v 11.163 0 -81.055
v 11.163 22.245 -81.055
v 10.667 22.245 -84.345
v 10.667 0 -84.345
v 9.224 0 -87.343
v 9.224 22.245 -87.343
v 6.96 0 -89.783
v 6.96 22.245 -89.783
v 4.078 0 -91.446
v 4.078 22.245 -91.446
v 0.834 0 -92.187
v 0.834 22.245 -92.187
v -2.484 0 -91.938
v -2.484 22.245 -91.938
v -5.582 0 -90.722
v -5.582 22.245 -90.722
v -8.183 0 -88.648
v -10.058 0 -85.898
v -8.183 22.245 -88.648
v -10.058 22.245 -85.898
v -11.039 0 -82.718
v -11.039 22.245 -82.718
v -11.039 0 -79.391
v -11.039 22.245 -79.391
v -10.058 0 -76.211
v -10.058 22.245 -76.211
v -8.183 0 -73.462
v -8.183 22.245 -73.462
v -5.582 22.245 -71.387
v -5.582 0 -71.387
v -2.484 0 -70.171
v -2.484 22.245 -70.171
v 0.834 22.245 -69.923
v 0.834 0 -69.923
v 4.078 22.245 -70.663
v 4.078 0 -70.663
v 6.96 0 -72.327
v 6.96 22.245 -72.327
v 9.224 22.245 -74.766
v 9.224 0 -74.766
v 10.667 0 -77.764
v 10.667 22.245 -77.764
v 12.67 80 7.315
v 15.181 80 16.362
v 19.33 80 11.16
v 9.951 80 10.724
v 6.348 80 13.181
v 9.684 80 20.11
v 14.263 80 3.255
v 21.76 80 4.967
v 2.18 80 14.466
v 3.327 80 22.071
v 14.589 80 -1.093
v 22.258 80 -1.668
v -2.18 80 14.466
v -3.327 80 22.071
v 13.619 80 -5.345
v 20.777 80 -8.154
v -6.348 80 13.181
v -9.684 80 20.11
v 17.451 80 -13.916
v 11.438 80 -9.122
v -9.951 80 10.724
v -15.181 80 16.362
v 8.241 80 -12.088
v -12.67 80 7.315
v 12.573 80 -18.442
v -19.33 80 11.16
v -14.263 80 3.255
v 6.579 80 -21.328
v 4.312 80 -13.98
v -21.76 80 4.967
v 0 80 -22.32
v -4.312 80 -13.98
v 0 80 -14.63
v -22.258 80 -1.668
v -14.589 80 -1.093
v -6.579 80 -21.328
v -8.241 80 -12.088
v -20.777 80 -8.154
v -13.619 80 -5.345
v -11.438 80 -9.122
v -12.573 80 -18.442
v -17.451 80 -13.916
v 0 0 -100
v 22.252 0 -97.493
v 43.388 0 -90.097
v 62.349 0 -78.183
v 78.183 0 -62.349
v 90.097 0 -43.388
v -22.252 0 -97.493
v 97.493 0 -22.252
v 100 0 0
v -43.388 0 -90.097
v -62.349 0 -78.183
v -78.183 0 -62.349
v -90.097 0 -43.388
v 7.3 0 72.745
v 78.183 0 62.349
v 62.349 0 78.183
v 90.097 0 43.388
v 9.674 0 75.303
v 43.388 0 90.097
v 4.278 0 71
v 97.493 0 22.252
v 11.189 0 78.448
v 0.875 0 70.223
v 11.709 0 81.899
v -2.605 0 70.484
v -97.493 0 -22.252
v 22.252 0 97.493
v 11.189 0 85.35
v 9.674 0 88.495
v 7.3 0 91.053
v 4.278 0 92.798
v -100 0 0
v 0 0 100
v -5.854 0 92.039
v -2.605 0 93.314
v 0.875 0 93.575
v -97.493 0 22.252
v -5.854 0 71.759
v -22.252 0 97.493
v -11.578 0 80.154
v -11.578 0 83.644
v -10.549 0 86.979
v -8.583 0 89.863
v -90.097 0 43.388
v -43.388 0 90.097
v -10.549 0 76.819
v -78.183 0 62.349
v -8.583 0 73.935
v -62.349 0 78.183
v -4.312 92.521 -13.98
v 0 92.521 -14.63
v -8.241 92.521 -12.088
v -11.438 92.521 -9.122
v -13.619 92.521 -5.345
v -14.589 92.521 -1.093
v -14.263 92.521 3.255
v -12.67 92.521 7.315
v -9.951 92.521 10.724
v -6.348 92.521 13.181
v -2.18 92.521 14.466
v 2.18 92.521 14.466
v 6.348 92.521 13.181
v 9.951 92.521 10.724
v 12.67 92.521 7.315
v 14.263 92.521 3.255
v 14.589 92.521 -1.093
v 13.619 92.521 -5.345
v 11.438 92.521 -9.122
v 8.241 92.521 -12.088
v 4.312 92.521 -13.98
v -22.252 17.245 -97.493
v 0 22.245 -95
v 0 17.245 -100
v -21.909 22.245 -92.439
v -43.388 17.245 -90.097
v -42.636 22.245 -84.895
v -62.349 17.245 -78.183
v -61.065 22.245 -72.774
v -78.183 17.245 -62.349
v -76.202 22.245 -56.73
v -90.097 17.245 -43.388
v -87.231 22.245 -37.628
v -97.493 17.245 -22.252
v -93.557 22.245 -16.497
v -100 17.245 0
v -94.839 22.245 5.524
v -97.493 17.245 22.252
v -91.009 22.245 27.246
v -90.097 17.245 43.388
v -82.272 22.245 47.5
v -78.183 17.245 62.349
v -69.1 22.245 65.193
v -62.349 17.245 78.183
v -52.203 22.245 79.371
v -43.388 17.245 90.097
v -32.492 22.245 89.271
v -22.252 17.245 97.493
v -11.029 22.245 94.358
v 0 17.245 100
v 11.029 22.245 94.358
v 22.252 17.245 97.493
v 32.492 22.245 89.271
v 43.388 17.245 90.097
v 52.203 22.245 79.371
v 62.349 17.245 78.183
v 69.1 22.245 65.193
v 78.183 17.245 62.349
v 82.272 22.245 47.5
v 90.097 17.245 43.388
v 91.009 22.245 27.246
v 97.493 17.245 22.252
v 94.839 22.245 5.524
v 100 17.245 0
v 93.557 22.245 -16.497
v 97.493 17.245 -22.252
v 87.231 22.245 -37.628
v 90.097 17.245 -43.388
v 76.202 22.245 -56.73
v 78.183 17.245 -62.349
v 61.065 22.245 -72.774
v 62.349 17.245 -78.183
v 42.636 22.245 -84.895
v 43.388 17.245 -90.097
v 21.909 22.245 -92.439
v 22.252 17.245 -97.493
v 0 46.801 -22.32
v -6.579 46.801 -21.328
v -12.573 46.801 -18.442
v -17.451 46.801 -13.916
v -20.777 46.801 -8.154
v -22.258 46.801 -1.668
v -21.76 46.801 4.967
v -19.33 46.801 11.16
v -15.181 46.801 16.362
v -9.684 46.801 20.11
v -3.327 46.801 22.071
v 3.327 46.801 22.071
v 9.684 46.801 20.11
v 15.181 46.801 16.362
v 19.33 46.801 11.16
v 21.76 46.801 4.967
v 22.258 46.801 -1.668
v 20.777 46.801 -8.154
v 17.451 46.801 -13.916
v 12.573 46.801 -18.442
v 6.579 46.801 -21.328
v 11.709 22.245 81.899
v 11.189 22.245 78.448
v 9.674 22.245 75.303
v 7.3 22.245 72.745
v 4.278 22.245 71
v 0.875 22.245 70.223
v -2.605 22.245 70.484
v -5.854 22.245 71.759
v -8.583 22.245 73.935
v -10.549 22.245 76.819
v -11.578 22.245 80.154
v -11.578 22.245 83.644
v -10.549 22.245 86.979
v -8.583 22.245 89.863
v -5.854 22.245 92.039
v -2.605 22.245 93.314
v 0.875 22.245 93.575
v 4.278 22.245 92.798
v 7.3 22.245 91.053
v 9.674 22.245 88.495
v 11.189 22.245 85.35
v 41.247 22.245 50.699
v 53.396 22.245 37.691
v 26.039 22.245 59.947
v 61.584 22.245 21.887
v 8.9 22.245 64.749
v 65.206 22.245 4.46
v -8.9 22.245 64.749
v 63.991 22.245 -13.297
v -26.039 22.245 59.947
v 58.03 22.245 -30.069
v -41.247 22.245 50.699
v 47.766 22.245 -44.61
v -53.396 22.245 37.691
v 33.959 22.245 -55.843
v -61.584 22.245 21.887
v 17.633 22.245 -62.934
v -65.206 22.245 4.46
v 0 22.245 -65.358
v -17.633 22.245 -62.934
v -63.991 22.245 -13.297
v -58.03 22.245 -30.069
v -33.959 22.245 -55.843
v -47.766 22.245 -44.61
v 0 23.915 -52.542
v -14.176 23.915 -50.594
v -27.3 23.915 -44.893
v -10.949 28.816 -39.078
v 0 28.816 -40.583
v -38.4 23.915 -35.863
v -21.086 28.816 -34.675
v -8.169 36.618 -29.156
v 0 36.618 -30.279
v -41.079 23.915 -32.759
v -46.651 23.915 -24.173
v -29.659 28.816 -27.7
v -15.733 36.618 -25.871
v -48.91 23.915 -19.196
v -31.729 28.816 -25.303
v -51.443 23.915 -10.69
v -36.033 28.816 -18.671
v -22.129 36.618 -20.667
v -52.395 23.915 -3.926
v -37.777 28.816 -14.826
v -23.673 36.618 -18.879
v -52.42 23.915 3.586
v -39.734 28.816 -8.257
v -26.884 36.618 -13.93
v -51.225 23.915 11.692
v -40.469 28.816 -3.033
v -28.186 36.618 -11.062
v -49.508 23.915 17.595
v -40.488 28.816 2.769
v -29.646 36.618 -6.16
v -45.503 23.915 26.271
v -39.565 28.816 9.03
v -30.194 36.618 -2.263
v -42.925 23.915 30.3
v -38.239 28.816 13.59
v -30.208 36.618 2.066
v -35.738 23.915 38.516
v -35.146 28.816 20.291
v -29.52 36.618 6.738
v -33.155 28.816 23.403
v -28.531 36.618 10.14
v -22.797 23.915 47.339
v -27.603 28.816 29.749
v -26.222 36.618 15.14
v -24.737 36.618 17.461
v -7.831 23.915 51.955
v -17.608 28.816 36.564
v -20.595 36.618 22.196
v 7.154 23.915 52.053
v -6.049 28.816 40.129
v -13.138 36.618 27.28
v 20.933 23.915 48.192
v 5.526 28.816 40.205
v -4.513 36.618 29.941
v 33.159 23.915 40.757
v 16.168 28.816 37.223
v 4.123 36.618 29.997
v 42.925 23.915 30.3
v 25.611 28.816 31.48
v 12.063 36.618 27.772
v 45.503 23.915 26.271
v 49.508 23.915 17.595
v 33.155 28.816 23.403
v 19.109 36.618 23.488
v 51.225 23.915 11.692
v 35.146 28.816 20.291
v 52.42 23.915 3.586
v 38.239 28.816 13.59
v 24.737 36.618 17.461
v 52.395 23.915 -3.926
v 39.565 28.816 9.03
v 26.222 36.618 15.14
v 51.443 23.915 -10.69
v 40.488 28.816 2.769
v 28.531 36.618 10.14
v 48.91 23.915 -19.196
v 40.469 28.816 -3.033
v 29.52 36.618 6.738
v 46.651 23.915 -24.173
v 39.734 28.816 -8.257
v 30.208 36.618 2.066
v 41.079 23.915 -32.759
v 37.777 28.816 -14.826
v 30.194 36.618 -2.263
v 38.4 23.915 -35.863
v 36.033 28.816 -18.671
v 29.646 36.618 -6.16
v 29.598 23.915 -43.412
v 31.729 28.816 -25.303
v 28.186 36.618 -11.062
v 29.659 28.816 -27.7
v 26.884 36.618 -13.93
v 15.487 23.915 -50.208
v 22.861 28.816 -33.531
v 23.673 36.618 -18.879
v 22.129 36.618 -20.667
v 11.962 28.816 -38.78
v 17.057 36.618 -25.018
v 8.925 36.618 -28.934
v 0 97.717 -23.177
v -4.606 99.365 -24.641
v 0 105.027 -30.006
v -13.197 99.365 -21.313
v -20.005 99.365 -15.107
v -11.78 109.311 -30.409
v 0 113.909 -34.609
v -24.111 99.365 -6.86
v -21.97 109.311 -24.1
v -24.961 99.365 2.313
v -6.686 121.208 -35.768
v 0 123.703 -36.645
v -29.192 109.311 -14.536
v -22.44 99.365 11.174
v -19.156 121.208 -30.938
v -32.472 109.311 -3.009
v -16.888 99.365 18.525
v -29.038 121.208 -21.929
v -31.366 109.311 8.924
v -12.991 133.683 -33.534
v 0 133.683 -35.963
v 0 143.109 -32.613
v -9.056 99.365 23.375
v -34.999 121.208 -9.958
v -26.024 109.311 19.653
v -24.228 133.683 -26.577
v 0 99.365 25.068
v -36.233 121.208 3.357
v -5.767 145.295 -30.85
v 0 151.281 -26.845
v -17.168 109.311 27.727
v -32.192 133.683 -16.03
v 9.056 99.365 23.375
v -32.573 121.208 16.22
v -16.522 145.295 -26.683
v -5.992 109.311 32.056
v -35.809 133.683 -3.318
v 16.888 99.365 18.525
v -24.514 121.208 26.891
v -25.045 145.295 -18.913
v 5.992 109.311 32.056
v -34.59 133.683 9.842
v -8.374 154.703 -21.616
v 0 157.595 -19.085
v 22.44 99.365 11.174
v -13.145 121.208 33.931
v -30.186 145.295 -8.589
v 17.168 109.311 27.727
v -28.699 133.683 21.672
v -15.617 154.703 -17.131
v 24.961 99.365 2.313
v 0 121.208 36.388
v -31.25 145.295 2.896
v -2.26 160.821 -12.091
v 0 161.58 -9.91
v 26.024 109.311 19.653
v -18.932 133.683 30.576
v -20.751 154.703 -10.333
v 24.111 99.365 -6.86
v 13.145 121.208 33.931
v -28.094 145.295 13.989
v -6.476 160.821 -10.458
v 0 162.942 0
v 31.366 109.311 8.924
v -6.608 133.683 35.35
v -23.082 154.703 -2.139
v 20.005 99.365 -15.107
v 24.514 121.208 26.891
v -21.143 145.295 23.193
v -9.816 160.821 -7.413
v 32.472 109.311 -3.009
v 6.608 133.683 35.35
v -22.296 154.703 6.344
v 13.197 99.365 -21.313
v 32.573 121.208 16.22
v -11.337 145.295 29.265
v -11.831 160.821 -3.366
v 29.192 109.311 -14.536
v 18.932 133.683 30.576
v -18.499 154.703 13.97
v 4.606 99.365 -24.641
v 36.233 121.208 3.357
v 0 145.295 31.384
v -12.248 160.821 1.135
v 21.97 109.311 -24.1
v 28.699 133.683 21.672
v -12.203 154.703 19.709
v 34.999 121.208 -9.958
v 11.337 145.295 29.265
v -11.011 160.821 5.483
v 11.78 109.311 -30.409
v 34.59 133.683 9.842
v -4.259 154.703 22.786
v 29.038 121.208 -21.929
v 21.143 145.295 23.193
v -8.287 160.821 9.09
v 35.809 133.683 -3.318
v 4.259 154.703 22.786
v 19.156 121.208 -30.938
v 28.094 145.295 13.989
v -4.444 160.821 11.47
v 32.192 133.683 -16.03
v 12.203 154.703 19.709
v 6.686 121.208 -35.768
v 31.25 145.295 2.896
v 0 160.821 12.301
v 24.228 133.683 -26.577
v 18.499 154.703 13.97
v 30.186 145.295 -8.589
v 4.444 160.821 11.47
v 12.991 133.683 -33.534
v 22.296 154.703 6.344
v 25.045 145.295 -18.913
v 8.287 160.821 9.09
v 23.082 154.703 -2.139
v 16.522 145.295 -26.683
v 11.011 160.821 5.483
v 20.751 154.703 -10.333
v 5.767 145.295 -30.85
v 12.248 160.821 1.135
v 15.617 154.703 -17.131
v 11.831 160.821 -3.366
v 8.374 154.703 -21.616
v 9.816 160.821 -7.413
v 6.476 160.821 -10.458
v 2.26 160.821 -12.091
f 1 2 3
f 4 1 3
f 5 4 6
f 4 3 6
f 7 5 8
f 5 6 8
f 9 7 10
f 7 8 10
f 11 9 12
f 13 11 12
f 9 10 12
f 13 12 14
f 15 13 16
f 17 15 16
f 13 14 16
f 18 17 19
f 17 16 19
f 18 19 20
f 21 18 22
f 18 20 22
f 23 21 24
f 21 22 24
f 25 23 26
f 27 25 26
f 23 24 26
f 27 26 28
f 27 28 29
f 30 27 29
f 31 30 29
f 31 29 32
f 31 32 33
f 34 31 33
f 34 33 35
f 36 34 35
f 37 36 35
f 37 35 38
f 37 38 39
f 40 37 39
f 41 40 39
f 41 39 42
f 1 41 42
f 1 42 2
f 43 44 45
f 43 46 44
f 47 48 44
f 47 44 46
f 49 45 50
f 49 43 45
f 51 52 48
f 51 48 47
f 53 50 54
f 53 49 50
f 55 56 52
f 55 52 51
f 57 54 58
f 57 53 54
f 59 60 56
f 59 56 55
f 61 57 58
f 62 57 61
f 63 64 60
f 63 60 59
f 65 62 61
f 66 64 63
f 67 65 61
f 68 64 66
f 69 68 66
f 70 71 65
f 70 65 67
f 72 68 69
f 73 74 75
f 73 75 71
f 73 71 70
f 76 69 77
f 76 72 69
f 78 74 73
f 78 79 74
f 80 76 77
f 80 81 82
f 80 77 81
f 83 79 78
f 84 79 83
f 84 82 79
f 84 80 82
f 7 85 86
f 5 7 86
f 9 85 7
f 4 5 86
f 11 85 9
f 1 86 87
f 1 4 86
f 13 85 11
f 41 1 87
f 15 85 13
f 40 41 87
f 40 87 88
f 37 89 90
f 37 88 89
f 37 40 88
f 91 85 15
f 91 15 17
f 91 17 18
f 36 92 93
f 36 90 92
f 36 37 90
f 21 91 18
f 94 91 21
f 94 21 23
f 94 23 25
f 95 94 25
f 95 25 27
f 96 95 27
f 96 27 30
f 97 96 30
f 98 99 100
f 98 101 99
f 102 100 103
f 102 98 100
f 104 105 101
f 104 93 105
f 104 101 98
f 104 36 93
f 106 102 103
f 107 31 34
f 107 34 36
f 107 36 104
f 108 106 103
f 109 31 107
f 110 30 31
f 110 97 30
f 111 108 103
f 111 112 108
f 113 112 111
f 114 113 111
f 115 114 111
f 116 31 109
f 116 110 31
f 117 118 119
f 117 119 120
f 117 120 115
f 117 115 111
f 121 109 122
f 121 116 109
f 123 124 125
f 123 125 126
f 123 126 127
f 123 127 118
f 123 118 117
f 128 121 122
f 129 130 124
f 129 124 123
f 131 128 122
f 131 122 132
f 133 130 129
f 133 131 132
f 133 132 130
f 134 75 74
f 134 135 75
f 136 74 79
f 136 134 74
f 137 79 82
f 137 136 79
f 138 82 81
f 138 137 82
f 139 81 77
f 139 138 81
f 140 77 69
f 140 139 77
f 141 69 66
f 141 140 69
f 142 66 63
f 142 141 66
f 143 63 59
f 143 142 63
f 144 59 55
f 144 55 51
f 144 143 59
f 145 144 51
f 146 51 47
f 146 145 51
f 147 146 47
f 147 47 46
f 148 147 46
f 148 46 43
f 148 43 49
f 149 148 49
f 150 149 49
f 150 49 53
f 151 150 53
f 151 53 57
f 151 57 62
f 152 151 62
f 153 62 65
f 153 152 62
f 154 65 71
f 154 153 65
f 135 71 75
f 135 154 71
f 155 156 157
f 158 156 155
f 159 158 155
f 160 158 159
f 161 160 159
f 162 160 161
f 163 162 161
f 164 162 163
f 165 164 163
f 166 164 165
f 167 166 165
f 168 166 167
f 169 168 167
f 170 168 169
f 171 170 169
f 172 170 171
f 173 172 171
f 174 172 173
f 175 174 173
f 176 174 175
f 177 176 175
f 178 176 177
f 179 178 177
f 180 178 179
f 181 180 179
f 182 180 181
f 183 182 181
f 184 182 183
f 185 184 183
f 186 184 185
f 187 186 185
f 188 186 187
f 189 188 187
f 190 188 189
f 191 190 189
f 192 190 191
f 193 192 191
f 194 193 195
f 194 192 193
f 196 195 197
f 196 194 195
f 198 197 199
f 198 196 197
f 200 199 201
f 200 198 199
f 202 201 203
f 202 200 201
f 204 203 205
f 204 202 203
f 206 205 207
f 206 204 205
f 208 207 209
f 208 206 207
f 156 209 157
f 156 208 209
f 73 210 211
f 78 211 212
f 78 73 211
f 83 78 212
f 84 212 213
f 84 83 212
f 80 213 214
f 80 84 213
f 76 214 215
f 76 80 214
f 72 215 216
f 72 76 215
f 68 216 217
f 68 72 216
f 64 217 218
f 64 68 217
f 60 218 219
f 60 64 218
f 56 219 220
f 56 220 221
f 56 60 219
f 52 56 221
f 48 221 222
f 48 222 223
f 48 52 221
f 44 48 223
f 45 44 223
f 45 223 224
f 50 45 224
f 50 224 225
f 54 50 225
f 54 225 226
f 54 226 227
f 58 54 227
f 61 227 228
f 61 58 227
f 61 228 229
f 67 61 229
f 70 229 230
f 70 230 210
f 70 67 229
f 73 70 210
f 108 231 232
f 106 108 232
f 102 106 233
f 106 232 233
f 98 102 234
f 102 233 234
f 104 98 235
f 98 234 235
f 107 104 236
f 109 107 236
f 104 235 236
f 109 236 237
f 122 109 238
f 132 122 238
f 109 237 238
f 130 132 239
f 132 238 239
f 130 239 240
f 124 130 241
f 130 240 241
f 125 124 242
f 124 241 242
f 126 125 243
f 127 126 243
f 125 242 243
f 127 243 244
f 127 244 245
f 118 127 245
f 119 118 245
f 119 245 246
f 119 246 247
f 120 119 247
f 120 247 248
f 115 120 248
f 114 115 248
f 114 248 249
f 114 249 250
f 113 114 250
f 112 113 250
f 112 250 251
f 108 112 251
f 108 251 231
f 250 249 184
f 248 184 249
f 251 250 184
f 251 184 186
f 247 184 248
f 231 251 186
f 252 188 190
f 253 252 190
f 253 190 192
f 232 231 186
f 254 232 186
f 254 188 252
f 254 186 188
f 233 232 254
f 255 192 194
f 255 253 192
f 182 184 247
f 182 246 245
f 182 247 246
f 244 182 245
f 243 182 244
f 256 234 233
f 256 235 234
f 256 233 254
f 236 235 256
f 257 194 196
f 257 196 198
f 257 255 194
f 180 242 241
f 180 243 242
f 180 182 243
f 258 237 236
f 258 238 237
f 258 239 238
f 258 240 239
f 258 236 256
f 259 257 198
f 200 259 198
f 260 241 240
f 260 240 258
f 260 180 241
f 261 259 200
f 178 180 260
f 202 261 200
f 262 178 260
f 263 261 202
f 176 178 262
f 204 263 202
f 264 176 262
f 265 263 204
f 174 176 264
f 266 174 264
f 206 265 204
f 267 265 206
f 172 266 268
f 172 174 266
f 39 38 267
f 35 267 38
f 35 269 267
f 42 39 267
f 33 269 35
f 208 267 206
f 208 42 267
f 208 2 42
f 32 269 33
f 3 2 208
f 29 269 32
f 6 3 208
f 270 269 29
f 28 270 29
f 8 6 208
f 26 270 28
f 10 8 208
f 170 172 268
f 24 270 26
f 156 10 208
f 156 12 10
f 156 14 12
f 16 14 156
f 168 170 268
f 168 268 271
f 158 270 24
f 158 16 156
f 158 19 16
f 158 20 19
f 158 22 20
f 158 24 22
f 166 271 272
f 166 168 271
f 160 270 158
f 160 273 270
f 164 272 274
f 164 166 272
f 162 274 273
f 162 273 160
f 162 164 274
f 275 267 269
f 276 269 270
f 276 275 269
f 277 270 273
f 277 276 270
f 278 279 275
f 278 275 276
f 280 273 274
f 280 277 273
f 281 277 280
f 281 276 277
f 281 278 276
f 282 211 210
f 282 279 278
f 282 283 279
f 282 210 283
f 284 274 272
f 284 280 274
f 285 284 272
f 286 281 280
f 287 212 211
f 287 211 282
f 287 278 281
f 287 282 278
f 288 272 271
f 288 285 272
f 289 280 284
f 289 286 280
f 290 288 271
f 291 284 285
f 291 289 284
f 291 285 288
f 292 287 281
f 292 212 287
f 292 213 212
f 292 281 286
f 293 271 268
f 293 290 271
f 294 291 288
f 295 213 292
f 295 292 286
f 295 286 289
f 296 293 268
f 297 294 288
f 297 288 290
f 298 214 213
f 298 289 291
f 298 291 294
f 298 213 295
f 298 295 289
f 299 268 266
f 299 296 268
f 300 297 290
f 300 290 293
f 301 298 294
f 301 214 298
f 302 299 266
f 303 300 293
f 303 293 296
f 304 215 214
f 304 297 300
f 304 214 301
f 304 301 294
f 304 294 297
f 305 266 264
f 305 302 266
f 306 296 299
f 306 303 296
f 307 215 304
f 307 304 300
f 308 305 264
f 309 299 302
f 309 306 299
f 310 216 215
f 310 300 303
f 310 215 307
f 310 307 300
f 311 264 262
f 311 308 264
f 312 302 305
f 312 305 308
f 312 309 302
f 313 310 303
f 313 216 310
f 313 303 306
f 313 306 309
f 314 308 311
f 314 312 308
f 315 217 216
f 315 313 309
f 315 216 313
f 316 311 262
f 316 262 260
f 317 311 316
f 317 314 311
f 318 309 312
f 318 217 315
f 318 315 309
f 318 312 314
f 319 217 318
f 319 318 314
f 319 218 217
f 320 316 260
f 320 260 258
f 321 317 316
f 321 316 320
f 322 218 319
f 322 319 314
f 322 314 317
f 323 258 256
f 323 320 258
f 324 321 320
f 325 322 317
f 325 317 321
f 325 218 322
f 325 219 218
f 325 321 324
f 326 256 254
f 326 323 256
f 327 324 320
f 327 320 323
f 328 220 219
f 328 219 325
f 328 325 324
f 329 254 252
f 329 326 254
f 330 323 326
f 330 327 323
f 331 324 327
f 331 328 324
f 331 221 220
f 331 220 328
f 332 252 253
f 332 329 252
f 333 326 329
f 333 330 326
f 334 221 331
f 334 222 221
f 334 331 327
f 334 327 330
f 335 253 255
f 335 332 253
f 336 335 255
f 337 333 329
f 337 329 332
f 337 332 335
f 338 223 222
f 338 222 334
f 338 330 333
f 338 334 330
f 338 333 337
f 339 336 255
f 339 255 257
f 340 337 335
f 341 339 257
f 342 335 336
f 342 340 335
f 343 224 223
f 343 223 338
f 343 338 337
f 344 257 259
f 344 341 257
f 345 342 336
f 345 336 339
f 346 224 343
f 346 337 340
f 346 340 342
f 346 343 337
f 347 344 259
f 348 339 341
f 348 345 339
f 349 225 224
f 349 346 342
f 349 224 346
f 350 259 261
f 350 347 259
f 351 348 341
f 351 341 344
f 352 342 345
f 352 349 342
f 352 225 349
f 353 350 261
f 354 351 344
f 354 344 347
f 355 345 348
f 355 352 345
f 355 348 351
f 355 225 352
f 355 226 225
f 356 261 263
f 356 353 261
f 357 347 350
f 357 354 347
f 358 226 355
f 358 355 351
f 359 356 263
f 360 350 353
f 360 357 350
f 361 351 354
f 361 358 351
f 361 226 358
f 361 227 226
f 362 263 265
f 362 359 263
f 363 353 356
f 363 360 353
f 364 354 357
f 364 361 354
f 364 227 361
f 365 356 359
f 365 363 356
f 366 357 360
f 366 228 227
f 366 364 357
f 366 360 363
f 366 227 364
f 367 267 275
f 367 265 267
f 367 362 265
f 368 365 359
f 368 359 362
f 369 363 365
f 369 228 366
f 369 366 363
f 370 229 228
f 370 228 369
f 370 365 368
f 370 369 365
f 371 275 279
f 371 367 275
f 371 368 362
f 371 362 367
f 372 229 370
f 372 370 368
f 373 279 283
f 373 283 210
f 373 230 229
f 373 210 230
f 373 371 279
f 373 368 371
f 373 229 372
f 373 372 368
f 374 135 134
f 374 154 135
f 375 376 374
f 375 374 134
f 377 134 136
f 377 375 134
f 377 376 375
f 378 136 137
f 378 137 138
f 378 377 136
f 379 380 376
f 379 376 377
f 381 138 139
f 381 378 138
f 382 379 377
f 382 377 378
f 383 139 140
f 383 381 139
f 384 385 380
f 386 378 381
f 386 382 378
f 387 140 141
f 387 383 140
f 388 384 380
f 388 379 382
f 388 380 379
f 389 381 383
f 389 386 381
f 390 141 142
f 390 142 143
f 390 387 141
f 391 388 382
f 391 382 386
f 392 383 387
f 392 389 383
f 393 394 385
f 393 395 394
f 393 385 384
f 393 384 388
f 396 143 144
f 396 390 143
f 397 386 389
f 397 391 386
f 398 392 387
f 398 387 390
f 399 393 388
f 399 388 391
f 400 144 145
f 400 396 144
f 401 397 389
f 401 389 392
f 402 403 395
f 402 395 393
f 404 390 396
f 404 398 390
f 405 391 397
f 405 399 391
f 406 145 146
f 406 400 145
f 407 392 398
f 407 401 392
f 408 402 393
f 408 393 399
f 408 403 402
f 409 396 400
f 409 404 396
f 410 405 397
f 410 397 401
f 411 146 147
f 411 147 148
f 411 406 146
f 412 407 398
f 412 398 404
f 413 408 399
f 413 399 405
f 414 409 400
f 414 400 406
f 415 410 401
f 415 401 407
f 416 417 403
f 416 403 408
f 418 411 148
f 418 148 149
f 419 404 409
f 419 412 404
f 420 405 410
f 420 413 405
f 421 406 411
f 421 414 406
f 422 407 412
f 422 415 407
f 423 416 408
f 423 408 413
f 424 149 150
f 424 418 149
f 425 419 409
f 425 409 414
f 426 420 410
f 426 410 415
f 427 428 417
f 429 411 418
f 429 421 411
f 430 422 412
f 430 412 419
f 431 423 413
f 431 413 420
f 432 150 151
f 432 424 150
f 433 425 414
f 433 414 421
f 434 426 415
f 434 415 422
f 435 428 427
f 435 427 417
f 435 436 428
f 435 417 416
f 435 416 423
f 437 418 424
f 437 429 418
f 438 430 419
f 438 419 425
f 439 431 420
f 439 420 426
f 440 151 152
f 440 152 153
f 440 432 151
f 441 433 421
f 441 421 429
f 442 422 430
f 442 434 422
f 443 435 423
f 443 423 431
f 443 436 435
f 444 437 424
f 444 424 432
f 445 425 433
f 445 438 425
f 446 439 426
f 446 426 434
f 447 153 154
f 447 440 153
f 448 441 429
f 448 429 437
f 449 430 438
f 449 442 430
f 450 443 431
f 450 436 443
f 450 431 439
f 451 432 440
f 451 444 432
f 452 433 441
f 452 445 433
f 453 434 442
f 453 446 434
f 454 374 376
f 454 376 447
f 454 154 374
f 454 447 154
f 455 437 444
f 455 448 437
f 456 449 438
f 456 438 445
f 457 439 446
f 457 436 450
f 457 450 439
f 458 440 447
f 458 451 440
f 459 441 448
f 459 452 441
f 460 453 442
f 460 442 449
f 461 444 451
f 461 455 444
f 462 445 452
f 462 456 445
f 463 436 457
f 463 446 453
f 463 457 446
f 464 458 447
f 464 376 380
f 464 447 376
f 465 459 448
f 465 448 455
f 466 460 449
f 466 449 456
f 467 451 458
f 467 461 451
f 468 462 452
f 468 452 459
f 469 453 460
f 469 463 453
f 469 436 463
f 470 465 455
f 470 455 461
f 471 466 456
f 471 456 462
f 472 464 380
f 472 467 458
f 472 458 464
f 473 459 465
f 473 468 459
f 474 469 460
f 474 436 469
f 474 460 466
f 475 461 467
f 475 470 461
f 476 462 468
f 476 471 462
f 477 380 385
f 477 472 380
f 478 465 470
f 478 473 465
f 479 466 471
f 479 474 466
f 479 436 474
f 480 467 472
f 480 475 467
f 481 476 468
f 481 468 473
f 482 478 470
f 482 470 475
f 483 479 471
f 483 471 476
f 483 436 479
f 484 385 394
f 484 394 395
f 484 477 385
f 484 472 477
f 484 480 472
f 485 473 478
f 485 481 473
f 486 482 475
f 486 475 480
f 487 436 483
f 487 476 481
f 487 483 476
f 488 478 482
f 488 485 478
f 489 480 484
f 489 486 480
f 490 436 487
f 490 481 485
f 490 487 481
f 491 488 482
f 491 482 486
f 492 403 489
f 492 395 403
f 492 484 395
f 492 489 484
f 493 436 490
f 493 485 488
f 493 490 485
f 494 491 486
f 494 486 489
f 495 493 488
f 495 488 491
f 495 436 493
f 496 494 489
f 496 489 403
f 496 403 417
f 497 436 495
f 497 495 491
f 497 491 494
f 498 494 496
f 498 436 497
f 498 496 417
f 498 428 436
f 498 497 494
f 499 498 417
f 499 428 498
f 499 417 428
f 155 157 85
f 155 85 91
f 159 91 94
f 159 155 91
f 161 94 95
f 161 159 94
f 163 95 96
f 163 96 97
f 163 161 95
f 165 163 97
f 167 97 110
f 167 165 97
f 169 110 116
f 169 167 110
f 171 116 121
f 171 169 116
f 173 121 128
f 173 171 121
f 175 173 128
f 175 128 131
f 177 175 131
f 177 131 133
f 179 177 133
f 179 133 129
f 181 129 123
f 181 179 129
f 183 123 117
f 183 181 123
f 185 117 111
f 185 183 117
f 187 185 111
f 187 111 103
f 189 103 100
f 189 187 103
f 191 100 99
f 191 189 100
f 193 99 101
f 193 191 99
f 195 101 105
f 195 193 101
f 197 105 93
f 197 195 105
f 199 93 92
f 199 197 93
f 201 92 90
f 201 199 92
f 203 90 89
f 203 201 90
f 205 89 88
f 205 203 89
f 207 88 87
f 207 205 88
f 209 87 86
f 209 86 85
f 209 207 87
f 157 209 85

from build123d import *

# Parameters (mm, degrees)
CROQUIS2_R            = 11.708753873
CROQUIS2_R_2          = 11.163314546
CORTAR_EXTRUIR1_DEPTH = 40
CHAFL_N1_SIZE         = 5


with BuildPart() as part:
    # Croquis1 → Revolución1 (revolve)
    with BuildSketch(Plane(origin=(0, 0, 0), x_dir=(0, 0, -1), z_dir=(1, 0, 0))):
        with BuildLine():
            Line((0, 0), (100, 0))
            Line((100, 0), (100, 22.244599069))
            Line((100, 22.244599069), (65.358062391, 22.244599069))
            ThreePointArc((65.358062391, 22.244599069), (40.58262282, 28.815543652), (22.320043888, 46.801035845))
            Line((22.320043888, 46.801035845), (22.320043888, 80))
            Line((22.320043888, 80), (14.629845341, 80))
            Line((14.629845341, 80), (14.629845341, 92.520583479))
            ThreePointArc((14.629845341, 92.520583479), (35.962664377, 133.682908793), (0, 162.942316925))
            Line((0, 162.942316925), (0, 0))
        make_face()
    revolve(axis=Axis((0, 0, 0), (0, 1, 0)))

    # Croquis2 → Cortar-Extruir1 (cut)
    with BuildSketch(Plane(origin=(0, 22.244599069, 0), x_dir=(1, 0, 0), z_dir=(0, 1, 0))):
        with Locations((0, -81.89901044)):
            Circle(CROQUIS2_R)
        with Locations((0, 81.054690745)):
            Circle(CROQUIS2_R_2)
    extrude(amount=-CORTAR_EXTRUIR1_DEPTH, mode=Mode.SUBTRACT)

    # Chaflán1
    chafl_n1_edges = [part.edges().sort_by_distance(p)[0] for p in [
        (0, 22.244599069, 100),
    ]]
    chamfer(chafl_n1_edges, length=CHAFL_N1_SIZE)


solid = part.part
